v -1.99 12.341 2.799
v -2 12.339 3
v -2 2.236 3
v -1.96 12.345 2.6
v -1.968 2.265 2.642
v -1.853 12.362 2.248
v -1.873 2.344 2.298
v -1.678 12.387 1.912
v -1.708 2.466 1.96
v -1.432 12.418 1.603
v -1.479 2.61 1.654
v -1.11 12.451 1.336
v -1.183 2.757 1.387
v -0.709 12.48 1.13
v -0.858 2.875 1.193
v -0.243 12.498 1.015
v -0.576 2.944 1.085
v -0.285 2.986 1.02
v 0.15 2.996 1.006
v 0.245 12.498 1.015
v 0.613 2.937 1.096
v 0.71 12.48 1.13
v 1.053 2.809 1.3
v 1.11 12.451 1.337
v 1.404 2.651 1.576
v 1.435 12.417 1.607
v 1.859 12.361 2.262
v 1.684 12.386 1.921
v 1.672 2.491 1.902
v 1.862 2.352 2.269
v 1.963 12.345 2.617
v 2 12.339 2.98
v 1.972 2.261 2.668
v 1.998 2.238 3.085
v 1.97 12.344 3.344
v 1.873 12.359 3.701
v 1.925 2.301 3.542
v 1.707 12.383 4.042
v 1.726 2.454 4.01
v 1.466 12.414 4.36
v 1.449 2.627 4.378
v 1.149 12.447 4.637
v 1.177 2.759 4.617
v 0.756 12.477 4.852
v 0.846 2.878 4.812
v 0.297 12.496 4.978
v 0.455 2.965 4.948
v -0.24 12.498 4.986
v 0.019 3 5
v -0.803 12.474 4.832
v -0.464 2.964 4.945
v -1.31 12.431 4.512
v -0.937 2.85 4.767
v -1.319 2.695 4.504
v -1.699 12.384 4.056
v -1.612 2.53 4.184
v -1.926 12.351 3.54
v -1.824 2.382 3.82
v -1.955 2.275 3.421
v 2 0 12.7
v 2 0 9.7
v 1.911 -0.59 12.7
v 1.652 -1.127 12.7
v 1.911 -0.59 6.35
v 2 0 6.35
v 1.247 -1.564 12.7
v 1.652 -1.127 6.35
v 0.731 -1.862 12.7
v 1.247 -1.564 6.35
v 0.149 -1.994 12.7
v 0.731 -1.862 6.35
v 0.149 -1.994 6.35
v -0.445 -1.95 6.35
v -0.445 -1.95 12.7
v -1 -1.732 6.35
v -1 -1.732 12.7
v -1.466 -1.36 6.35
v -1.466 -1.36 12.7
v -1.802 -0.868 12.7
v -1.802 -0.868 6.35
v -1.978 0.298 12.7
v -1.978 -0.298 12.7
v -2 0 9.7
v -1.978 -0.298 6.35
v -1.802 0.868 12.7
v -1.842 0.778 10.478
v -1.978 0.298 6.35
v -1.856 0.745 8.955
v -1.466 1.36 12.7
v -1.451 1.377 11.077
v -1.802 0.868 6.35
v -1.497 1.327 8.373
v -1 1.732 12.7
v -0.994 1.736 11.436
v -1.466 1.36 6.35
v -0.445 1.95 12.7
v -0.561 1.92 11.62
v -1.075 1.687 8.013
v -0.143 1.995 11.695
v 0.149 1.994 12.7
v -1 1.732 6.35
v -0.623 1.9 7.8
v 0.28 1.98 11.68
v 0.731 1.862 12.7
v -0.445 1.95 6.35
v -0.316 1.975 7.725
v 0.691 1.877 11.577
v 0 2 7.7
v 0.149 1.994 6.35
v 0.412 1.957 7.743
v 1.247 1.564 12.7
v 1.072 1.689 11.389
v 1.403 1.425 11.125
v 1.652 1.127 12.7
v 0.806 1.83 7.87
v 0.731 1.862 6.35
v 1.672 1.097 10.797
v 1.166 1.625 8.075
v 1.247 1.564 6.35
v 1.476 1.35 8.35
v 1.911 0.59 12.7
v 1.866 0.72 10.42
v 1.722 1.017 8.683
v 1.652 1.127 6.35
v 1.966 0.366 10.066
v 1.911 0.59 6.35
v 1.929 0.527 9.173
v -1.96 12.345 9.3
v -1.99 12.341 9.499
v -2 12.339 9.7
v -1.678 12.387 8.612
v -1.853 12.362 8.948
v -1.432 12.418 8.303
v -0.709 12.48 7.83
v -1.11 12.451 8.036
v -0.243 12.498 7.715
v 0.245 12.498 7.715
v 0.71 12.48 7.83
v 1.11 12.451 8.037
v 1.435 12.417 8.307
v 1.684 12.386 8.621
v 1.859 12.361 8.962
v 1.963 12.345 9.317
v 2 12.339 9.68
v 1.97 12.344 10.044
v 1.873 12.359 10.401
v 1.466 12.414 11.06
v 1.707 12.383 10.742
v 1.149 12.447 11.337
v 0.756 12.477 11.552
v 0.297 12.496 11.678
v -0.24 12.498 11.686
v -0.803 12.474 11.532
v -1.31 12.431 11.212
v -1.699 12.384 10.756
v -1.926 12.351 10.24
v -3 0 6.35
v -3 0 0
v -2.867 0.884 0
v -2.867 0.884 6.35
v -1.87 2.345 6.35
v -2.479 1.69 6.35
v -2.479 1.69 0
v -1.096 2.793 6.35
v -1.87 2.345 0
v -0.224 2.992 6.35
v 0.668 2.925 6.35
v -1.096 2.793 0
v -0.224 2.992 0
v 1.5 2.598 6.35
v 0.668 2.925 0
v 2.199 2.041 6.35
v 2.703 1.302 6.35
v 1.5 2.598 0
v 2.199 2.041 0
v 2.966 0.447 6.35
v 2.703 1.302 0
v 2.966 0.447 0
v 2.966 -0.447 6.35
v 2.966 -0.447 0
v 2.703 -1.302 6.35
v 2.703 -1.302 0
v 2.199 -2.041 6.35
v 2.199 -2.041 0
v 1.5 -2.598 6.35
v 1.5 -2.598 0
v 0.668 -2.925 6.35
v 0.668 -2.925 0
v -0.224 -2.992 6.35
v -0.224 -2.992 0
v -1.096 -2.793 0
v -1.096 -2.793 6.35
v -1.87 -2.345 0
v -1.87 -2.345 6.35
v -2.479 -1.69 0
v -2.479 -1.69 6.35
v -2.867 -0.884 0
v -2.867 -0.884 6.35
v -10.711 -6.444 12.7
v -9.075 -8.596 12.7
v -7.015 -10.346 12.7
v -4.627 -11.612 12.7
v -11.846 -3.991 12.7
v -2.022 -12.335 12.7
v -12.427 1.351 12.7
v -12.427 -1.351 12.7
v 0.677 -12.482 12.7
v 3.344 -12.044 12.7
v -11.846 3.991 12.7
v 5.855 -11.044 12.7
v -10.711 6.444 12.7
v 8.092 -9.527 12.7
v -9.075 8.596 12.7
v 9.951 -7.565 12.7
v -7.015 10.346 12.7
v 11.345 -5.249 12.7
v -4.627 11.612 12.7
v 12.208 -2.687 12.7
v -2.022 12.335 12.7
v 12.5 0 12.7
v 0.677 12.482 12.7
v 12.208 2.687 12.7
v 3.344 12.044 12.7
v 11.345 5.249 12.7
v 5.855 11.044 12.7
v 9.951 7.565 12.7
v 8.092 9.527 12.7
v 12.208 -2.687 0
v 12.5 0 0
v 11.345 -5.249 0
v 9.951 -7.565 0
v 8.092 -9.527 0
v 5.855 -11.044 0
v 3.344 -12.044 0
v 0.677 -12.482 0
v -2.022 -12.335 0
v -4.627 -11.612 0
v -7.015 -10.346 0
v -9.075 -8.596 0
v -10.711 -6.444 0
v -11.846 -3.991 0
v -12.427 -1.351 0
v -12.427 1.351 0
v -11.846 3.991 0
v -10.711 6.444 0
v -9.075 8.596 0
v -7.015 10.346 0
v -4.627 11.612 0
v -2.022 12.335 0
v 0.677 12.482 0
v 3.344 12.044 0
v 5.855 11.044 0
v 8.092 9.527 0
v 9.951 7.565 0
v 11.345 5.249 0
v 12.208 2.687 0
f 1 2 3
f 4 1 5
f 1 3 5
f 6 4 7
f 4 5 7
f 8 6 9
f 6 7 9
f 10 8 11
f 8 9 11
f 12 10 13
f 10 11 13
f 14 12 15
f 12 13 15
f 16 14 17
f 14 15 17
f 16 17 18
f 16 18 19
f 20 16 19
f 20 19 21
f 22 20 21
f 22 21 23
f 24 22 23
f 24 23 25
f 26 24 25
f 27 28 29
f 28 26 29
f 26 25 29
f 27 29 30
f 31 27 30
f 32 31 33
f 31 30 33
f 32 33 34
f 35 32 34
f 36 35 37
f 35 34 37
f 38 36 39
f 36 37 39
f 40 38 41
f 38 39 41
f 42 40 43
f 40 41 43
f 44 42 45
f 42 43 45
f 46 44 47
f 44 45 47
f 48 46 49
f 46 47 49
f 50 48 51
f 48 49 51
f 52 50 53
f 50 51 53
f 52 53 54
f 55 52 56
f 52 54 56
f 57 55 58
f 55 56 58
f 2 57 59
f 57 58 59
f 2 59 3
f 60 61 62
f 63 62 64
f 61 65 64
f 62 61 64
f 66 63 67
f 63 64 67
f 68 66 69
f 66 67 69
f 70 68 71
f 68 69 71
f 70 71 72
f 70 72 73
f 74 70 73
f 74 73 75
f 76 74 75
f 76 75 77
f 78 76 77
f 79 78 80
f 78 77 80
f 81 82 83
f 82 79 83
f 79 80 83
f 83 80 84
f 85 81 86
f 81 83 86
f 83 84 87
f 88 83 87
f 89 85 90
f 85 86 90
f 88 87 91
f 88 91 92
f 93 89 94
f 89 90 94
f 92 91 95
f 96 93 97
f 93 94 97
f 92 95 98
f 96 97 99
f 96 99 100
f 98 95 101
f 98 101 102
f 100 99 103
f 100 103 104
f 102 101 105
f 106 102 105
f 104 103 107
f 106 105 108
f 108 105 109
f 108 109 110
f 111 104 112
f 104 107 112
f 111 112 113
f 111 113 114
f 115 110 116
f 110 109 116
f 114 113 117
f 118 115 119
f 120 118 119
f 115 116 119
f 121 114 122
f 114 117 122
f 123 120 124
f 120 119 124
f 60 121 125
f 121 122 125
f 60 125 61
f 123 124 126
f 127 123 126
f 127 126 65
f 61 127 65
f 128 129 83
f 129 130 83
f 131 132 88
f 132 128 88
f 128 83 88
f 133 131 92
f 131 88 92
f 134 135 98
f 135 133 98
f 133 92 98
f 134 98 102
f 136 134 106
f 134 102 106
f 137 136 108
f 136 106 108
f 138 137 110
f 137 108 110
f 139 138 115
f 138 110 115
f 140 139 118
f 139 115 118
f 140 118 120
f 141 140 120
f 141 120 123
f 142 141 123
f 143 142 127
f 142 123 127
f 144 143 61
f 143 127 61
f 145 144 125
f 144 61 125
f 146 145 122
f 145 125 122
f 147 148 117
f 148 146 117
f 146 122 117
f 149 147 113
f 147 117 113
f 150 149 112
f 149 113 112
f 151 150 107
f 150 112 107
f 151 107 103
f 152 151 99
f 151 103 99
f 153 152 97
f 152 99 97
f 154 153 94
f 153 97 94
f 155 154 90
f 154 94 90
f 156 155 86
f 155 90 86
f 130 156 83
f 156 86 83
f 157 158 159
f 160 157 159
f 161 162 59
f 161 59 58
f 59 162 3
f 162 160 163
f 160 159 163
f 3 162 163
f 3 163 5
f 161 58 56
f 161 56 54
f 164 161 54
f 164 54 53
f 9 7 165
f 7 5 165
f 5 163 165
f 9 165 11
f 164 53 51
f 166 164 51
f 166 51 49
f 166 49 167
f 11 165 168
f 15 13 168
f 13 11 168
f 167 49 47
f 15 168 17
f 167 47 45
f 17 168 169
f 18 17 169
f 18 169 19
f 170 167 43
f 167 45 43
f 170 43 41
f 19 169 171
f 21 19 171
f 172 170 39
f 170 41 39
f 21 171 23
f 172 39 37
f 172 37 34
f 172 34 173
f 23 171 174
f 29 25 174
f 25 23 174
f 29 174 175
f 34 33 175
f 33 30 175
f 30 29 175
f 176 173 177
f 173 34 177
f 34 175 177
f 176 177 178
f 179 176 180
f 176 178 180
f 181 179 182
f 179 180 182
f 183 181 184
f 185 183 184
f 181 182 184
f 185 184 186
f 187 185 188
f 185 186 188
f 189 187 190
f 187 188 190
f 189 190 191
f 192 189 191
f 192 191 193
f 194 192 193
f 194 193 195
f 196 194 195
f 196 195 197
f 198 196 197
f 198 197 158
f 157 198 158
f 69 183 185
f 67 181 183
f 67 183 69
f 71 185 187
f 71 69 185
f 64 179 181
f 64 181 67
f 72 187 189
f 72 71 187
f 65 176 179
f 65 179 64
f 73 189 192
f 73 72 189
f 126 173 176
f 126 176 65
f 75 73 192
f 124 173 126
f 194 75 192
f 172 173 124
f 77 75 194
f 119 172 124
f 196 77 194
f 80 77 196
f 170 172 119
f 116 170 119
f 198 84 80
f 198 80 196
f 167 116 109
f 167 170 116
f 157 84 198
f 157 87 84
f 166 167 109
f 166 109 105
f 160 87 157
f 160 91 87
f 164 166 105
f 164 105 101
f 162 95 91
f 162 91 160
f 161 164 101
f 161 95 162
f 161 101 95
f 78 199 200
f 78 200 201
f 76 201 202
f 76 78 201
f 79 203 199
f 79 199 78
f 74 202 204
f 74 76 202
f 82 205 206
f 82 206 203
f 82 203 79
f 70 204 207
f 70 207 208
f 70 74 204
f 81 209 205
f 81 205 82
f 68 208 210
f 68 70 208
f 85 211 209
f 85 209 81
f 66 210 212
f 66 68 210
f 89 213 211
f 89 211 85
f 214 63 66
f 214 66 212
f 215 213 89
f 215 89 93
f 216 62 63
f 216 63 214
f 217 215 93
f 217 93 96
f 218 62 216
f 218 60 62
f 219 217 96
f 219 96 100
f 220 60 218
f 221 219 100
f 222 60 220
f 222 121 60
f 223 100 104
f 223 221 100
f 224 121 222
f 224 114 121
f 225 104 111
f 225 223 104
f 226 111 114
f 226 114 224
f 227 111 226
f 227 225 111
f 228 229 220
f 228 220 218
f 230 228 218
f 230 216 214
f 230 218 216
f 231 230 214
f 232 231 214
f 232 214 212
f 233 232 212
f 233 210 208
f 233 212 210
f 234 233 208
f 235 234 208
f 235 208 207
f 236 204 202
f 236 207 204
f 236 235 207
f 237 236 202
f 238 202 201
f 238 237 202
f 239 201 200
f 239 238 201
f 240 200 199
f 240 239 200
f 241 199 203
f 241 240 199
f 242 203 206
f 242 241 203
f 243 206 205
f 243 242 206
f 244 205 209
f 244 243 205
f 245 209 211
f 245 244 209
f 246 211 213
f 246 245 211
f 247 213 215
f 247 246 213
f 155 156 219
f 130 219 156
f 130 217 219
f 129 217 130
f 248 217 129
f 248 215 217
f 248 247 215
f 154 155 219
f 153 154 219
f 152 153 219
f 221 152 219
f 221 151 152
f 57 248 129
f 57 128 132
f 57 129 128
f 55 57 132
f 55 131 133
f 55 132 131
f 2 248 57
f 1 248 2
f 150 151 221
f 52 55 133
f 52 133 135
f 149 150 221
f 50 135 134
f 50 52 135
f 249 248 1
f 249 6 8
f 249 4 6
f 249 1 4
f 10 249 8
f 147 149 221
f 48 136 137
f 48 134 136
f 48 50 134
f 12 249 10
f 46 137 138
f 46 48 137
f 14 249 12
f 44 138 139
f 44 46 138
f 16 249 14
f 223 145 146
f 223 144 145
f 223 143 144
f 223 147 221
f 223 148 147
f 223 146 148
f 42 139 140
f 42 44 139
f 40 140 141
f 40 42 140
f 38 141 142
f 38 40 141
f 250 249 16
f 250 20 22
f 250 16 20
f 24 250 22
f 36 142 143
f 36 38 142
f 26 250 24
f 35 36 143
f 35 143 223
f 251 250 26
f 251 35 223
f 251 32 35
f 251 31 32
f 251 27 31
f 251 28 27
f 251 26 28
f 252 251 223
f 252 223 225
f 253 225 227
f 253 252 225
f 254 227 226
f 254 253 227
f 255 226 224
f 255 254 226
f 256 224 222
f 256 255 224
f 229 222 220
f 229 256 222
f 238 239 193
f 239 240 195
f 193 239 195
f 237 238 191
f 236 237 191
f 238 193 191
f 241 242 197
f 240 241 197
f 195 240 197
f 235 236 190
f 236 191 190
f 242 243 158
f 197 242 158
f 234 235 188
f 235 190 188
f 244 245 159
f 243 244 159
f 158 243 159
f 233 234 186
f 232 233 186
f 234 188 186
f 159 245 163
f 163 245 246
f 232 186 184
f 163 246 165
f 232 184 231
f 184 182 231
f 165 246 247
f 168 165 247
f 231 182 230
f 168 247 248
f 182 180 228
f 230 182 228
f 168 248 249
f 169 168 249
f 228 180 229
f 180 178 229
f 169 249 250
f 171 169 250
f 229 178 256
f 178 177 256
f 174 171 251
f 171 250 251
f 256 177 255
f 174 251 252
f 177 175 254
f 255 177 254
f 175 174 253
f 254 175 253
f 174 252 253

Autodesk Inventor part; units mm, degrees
ref_plane "YZ Plane" through (0, 0, 0) normal (1, 0, 0) x (0, 1, 0)
ref_plane "XZ Plane" through (0, 0, 0) normal (0, 1, 0) x (-1, 0, 0)
ref_plane "XY Plane" through (0, 0, 0) normal (0, 0, 1) x (1, 0, 0)
sketch "Sketch1" plane through (0, 0, 0) normal (0, 0, 1) x (1, 0, 0)
  circle A0 centre (0, 0) radius 12.5
  circle A1 centre (0, 0) radius 2
  dimension "d1" = 4
  dimension "d32" = 25
extrude "Extrusion1" add sketch "Sketch1" along normal blind 12.7
sketch "Sketch8" plane through (0, 0, 0) normal (0, 1, 0) x (-1, 0, 0)
  circle A0 centre (0, 3) radius 2
  circle A1 centre (0, 9.7) radius 2
  line L0 (2, 0) -> (-2, 0) projected
  line L1 (-2, 12.7) -> (2, 12.7) projected
  point P0 (0, 0)
  point P1 (0, 0)
  dimension "d33" = 4
  dimension "d34" = 4
  dimension "d35" = 3
  dimension "d36" = 3
extrude "Extrusion6" cut sketch "Sketch8" along normal through all
sketch "Sketch9" plane through (0, 0, 0) normal (0, 0, -1) x (-1, 0, 0)
  circle A0 centre (0, 0) radius 3
  dimension "d39" = 6
extrude "Extrusion7" cut sketch "Sketch9" against normal blind 6.35
thread "Thread1" size "M4x0.7" class "6H" standard "ANSI Metric M Profile" full length
thread "Thread2" size "M4x0.7" class "6H" standard "ANSI Metric M Profile" full length
properties part number "AA050" material "Aluminum 6061"
